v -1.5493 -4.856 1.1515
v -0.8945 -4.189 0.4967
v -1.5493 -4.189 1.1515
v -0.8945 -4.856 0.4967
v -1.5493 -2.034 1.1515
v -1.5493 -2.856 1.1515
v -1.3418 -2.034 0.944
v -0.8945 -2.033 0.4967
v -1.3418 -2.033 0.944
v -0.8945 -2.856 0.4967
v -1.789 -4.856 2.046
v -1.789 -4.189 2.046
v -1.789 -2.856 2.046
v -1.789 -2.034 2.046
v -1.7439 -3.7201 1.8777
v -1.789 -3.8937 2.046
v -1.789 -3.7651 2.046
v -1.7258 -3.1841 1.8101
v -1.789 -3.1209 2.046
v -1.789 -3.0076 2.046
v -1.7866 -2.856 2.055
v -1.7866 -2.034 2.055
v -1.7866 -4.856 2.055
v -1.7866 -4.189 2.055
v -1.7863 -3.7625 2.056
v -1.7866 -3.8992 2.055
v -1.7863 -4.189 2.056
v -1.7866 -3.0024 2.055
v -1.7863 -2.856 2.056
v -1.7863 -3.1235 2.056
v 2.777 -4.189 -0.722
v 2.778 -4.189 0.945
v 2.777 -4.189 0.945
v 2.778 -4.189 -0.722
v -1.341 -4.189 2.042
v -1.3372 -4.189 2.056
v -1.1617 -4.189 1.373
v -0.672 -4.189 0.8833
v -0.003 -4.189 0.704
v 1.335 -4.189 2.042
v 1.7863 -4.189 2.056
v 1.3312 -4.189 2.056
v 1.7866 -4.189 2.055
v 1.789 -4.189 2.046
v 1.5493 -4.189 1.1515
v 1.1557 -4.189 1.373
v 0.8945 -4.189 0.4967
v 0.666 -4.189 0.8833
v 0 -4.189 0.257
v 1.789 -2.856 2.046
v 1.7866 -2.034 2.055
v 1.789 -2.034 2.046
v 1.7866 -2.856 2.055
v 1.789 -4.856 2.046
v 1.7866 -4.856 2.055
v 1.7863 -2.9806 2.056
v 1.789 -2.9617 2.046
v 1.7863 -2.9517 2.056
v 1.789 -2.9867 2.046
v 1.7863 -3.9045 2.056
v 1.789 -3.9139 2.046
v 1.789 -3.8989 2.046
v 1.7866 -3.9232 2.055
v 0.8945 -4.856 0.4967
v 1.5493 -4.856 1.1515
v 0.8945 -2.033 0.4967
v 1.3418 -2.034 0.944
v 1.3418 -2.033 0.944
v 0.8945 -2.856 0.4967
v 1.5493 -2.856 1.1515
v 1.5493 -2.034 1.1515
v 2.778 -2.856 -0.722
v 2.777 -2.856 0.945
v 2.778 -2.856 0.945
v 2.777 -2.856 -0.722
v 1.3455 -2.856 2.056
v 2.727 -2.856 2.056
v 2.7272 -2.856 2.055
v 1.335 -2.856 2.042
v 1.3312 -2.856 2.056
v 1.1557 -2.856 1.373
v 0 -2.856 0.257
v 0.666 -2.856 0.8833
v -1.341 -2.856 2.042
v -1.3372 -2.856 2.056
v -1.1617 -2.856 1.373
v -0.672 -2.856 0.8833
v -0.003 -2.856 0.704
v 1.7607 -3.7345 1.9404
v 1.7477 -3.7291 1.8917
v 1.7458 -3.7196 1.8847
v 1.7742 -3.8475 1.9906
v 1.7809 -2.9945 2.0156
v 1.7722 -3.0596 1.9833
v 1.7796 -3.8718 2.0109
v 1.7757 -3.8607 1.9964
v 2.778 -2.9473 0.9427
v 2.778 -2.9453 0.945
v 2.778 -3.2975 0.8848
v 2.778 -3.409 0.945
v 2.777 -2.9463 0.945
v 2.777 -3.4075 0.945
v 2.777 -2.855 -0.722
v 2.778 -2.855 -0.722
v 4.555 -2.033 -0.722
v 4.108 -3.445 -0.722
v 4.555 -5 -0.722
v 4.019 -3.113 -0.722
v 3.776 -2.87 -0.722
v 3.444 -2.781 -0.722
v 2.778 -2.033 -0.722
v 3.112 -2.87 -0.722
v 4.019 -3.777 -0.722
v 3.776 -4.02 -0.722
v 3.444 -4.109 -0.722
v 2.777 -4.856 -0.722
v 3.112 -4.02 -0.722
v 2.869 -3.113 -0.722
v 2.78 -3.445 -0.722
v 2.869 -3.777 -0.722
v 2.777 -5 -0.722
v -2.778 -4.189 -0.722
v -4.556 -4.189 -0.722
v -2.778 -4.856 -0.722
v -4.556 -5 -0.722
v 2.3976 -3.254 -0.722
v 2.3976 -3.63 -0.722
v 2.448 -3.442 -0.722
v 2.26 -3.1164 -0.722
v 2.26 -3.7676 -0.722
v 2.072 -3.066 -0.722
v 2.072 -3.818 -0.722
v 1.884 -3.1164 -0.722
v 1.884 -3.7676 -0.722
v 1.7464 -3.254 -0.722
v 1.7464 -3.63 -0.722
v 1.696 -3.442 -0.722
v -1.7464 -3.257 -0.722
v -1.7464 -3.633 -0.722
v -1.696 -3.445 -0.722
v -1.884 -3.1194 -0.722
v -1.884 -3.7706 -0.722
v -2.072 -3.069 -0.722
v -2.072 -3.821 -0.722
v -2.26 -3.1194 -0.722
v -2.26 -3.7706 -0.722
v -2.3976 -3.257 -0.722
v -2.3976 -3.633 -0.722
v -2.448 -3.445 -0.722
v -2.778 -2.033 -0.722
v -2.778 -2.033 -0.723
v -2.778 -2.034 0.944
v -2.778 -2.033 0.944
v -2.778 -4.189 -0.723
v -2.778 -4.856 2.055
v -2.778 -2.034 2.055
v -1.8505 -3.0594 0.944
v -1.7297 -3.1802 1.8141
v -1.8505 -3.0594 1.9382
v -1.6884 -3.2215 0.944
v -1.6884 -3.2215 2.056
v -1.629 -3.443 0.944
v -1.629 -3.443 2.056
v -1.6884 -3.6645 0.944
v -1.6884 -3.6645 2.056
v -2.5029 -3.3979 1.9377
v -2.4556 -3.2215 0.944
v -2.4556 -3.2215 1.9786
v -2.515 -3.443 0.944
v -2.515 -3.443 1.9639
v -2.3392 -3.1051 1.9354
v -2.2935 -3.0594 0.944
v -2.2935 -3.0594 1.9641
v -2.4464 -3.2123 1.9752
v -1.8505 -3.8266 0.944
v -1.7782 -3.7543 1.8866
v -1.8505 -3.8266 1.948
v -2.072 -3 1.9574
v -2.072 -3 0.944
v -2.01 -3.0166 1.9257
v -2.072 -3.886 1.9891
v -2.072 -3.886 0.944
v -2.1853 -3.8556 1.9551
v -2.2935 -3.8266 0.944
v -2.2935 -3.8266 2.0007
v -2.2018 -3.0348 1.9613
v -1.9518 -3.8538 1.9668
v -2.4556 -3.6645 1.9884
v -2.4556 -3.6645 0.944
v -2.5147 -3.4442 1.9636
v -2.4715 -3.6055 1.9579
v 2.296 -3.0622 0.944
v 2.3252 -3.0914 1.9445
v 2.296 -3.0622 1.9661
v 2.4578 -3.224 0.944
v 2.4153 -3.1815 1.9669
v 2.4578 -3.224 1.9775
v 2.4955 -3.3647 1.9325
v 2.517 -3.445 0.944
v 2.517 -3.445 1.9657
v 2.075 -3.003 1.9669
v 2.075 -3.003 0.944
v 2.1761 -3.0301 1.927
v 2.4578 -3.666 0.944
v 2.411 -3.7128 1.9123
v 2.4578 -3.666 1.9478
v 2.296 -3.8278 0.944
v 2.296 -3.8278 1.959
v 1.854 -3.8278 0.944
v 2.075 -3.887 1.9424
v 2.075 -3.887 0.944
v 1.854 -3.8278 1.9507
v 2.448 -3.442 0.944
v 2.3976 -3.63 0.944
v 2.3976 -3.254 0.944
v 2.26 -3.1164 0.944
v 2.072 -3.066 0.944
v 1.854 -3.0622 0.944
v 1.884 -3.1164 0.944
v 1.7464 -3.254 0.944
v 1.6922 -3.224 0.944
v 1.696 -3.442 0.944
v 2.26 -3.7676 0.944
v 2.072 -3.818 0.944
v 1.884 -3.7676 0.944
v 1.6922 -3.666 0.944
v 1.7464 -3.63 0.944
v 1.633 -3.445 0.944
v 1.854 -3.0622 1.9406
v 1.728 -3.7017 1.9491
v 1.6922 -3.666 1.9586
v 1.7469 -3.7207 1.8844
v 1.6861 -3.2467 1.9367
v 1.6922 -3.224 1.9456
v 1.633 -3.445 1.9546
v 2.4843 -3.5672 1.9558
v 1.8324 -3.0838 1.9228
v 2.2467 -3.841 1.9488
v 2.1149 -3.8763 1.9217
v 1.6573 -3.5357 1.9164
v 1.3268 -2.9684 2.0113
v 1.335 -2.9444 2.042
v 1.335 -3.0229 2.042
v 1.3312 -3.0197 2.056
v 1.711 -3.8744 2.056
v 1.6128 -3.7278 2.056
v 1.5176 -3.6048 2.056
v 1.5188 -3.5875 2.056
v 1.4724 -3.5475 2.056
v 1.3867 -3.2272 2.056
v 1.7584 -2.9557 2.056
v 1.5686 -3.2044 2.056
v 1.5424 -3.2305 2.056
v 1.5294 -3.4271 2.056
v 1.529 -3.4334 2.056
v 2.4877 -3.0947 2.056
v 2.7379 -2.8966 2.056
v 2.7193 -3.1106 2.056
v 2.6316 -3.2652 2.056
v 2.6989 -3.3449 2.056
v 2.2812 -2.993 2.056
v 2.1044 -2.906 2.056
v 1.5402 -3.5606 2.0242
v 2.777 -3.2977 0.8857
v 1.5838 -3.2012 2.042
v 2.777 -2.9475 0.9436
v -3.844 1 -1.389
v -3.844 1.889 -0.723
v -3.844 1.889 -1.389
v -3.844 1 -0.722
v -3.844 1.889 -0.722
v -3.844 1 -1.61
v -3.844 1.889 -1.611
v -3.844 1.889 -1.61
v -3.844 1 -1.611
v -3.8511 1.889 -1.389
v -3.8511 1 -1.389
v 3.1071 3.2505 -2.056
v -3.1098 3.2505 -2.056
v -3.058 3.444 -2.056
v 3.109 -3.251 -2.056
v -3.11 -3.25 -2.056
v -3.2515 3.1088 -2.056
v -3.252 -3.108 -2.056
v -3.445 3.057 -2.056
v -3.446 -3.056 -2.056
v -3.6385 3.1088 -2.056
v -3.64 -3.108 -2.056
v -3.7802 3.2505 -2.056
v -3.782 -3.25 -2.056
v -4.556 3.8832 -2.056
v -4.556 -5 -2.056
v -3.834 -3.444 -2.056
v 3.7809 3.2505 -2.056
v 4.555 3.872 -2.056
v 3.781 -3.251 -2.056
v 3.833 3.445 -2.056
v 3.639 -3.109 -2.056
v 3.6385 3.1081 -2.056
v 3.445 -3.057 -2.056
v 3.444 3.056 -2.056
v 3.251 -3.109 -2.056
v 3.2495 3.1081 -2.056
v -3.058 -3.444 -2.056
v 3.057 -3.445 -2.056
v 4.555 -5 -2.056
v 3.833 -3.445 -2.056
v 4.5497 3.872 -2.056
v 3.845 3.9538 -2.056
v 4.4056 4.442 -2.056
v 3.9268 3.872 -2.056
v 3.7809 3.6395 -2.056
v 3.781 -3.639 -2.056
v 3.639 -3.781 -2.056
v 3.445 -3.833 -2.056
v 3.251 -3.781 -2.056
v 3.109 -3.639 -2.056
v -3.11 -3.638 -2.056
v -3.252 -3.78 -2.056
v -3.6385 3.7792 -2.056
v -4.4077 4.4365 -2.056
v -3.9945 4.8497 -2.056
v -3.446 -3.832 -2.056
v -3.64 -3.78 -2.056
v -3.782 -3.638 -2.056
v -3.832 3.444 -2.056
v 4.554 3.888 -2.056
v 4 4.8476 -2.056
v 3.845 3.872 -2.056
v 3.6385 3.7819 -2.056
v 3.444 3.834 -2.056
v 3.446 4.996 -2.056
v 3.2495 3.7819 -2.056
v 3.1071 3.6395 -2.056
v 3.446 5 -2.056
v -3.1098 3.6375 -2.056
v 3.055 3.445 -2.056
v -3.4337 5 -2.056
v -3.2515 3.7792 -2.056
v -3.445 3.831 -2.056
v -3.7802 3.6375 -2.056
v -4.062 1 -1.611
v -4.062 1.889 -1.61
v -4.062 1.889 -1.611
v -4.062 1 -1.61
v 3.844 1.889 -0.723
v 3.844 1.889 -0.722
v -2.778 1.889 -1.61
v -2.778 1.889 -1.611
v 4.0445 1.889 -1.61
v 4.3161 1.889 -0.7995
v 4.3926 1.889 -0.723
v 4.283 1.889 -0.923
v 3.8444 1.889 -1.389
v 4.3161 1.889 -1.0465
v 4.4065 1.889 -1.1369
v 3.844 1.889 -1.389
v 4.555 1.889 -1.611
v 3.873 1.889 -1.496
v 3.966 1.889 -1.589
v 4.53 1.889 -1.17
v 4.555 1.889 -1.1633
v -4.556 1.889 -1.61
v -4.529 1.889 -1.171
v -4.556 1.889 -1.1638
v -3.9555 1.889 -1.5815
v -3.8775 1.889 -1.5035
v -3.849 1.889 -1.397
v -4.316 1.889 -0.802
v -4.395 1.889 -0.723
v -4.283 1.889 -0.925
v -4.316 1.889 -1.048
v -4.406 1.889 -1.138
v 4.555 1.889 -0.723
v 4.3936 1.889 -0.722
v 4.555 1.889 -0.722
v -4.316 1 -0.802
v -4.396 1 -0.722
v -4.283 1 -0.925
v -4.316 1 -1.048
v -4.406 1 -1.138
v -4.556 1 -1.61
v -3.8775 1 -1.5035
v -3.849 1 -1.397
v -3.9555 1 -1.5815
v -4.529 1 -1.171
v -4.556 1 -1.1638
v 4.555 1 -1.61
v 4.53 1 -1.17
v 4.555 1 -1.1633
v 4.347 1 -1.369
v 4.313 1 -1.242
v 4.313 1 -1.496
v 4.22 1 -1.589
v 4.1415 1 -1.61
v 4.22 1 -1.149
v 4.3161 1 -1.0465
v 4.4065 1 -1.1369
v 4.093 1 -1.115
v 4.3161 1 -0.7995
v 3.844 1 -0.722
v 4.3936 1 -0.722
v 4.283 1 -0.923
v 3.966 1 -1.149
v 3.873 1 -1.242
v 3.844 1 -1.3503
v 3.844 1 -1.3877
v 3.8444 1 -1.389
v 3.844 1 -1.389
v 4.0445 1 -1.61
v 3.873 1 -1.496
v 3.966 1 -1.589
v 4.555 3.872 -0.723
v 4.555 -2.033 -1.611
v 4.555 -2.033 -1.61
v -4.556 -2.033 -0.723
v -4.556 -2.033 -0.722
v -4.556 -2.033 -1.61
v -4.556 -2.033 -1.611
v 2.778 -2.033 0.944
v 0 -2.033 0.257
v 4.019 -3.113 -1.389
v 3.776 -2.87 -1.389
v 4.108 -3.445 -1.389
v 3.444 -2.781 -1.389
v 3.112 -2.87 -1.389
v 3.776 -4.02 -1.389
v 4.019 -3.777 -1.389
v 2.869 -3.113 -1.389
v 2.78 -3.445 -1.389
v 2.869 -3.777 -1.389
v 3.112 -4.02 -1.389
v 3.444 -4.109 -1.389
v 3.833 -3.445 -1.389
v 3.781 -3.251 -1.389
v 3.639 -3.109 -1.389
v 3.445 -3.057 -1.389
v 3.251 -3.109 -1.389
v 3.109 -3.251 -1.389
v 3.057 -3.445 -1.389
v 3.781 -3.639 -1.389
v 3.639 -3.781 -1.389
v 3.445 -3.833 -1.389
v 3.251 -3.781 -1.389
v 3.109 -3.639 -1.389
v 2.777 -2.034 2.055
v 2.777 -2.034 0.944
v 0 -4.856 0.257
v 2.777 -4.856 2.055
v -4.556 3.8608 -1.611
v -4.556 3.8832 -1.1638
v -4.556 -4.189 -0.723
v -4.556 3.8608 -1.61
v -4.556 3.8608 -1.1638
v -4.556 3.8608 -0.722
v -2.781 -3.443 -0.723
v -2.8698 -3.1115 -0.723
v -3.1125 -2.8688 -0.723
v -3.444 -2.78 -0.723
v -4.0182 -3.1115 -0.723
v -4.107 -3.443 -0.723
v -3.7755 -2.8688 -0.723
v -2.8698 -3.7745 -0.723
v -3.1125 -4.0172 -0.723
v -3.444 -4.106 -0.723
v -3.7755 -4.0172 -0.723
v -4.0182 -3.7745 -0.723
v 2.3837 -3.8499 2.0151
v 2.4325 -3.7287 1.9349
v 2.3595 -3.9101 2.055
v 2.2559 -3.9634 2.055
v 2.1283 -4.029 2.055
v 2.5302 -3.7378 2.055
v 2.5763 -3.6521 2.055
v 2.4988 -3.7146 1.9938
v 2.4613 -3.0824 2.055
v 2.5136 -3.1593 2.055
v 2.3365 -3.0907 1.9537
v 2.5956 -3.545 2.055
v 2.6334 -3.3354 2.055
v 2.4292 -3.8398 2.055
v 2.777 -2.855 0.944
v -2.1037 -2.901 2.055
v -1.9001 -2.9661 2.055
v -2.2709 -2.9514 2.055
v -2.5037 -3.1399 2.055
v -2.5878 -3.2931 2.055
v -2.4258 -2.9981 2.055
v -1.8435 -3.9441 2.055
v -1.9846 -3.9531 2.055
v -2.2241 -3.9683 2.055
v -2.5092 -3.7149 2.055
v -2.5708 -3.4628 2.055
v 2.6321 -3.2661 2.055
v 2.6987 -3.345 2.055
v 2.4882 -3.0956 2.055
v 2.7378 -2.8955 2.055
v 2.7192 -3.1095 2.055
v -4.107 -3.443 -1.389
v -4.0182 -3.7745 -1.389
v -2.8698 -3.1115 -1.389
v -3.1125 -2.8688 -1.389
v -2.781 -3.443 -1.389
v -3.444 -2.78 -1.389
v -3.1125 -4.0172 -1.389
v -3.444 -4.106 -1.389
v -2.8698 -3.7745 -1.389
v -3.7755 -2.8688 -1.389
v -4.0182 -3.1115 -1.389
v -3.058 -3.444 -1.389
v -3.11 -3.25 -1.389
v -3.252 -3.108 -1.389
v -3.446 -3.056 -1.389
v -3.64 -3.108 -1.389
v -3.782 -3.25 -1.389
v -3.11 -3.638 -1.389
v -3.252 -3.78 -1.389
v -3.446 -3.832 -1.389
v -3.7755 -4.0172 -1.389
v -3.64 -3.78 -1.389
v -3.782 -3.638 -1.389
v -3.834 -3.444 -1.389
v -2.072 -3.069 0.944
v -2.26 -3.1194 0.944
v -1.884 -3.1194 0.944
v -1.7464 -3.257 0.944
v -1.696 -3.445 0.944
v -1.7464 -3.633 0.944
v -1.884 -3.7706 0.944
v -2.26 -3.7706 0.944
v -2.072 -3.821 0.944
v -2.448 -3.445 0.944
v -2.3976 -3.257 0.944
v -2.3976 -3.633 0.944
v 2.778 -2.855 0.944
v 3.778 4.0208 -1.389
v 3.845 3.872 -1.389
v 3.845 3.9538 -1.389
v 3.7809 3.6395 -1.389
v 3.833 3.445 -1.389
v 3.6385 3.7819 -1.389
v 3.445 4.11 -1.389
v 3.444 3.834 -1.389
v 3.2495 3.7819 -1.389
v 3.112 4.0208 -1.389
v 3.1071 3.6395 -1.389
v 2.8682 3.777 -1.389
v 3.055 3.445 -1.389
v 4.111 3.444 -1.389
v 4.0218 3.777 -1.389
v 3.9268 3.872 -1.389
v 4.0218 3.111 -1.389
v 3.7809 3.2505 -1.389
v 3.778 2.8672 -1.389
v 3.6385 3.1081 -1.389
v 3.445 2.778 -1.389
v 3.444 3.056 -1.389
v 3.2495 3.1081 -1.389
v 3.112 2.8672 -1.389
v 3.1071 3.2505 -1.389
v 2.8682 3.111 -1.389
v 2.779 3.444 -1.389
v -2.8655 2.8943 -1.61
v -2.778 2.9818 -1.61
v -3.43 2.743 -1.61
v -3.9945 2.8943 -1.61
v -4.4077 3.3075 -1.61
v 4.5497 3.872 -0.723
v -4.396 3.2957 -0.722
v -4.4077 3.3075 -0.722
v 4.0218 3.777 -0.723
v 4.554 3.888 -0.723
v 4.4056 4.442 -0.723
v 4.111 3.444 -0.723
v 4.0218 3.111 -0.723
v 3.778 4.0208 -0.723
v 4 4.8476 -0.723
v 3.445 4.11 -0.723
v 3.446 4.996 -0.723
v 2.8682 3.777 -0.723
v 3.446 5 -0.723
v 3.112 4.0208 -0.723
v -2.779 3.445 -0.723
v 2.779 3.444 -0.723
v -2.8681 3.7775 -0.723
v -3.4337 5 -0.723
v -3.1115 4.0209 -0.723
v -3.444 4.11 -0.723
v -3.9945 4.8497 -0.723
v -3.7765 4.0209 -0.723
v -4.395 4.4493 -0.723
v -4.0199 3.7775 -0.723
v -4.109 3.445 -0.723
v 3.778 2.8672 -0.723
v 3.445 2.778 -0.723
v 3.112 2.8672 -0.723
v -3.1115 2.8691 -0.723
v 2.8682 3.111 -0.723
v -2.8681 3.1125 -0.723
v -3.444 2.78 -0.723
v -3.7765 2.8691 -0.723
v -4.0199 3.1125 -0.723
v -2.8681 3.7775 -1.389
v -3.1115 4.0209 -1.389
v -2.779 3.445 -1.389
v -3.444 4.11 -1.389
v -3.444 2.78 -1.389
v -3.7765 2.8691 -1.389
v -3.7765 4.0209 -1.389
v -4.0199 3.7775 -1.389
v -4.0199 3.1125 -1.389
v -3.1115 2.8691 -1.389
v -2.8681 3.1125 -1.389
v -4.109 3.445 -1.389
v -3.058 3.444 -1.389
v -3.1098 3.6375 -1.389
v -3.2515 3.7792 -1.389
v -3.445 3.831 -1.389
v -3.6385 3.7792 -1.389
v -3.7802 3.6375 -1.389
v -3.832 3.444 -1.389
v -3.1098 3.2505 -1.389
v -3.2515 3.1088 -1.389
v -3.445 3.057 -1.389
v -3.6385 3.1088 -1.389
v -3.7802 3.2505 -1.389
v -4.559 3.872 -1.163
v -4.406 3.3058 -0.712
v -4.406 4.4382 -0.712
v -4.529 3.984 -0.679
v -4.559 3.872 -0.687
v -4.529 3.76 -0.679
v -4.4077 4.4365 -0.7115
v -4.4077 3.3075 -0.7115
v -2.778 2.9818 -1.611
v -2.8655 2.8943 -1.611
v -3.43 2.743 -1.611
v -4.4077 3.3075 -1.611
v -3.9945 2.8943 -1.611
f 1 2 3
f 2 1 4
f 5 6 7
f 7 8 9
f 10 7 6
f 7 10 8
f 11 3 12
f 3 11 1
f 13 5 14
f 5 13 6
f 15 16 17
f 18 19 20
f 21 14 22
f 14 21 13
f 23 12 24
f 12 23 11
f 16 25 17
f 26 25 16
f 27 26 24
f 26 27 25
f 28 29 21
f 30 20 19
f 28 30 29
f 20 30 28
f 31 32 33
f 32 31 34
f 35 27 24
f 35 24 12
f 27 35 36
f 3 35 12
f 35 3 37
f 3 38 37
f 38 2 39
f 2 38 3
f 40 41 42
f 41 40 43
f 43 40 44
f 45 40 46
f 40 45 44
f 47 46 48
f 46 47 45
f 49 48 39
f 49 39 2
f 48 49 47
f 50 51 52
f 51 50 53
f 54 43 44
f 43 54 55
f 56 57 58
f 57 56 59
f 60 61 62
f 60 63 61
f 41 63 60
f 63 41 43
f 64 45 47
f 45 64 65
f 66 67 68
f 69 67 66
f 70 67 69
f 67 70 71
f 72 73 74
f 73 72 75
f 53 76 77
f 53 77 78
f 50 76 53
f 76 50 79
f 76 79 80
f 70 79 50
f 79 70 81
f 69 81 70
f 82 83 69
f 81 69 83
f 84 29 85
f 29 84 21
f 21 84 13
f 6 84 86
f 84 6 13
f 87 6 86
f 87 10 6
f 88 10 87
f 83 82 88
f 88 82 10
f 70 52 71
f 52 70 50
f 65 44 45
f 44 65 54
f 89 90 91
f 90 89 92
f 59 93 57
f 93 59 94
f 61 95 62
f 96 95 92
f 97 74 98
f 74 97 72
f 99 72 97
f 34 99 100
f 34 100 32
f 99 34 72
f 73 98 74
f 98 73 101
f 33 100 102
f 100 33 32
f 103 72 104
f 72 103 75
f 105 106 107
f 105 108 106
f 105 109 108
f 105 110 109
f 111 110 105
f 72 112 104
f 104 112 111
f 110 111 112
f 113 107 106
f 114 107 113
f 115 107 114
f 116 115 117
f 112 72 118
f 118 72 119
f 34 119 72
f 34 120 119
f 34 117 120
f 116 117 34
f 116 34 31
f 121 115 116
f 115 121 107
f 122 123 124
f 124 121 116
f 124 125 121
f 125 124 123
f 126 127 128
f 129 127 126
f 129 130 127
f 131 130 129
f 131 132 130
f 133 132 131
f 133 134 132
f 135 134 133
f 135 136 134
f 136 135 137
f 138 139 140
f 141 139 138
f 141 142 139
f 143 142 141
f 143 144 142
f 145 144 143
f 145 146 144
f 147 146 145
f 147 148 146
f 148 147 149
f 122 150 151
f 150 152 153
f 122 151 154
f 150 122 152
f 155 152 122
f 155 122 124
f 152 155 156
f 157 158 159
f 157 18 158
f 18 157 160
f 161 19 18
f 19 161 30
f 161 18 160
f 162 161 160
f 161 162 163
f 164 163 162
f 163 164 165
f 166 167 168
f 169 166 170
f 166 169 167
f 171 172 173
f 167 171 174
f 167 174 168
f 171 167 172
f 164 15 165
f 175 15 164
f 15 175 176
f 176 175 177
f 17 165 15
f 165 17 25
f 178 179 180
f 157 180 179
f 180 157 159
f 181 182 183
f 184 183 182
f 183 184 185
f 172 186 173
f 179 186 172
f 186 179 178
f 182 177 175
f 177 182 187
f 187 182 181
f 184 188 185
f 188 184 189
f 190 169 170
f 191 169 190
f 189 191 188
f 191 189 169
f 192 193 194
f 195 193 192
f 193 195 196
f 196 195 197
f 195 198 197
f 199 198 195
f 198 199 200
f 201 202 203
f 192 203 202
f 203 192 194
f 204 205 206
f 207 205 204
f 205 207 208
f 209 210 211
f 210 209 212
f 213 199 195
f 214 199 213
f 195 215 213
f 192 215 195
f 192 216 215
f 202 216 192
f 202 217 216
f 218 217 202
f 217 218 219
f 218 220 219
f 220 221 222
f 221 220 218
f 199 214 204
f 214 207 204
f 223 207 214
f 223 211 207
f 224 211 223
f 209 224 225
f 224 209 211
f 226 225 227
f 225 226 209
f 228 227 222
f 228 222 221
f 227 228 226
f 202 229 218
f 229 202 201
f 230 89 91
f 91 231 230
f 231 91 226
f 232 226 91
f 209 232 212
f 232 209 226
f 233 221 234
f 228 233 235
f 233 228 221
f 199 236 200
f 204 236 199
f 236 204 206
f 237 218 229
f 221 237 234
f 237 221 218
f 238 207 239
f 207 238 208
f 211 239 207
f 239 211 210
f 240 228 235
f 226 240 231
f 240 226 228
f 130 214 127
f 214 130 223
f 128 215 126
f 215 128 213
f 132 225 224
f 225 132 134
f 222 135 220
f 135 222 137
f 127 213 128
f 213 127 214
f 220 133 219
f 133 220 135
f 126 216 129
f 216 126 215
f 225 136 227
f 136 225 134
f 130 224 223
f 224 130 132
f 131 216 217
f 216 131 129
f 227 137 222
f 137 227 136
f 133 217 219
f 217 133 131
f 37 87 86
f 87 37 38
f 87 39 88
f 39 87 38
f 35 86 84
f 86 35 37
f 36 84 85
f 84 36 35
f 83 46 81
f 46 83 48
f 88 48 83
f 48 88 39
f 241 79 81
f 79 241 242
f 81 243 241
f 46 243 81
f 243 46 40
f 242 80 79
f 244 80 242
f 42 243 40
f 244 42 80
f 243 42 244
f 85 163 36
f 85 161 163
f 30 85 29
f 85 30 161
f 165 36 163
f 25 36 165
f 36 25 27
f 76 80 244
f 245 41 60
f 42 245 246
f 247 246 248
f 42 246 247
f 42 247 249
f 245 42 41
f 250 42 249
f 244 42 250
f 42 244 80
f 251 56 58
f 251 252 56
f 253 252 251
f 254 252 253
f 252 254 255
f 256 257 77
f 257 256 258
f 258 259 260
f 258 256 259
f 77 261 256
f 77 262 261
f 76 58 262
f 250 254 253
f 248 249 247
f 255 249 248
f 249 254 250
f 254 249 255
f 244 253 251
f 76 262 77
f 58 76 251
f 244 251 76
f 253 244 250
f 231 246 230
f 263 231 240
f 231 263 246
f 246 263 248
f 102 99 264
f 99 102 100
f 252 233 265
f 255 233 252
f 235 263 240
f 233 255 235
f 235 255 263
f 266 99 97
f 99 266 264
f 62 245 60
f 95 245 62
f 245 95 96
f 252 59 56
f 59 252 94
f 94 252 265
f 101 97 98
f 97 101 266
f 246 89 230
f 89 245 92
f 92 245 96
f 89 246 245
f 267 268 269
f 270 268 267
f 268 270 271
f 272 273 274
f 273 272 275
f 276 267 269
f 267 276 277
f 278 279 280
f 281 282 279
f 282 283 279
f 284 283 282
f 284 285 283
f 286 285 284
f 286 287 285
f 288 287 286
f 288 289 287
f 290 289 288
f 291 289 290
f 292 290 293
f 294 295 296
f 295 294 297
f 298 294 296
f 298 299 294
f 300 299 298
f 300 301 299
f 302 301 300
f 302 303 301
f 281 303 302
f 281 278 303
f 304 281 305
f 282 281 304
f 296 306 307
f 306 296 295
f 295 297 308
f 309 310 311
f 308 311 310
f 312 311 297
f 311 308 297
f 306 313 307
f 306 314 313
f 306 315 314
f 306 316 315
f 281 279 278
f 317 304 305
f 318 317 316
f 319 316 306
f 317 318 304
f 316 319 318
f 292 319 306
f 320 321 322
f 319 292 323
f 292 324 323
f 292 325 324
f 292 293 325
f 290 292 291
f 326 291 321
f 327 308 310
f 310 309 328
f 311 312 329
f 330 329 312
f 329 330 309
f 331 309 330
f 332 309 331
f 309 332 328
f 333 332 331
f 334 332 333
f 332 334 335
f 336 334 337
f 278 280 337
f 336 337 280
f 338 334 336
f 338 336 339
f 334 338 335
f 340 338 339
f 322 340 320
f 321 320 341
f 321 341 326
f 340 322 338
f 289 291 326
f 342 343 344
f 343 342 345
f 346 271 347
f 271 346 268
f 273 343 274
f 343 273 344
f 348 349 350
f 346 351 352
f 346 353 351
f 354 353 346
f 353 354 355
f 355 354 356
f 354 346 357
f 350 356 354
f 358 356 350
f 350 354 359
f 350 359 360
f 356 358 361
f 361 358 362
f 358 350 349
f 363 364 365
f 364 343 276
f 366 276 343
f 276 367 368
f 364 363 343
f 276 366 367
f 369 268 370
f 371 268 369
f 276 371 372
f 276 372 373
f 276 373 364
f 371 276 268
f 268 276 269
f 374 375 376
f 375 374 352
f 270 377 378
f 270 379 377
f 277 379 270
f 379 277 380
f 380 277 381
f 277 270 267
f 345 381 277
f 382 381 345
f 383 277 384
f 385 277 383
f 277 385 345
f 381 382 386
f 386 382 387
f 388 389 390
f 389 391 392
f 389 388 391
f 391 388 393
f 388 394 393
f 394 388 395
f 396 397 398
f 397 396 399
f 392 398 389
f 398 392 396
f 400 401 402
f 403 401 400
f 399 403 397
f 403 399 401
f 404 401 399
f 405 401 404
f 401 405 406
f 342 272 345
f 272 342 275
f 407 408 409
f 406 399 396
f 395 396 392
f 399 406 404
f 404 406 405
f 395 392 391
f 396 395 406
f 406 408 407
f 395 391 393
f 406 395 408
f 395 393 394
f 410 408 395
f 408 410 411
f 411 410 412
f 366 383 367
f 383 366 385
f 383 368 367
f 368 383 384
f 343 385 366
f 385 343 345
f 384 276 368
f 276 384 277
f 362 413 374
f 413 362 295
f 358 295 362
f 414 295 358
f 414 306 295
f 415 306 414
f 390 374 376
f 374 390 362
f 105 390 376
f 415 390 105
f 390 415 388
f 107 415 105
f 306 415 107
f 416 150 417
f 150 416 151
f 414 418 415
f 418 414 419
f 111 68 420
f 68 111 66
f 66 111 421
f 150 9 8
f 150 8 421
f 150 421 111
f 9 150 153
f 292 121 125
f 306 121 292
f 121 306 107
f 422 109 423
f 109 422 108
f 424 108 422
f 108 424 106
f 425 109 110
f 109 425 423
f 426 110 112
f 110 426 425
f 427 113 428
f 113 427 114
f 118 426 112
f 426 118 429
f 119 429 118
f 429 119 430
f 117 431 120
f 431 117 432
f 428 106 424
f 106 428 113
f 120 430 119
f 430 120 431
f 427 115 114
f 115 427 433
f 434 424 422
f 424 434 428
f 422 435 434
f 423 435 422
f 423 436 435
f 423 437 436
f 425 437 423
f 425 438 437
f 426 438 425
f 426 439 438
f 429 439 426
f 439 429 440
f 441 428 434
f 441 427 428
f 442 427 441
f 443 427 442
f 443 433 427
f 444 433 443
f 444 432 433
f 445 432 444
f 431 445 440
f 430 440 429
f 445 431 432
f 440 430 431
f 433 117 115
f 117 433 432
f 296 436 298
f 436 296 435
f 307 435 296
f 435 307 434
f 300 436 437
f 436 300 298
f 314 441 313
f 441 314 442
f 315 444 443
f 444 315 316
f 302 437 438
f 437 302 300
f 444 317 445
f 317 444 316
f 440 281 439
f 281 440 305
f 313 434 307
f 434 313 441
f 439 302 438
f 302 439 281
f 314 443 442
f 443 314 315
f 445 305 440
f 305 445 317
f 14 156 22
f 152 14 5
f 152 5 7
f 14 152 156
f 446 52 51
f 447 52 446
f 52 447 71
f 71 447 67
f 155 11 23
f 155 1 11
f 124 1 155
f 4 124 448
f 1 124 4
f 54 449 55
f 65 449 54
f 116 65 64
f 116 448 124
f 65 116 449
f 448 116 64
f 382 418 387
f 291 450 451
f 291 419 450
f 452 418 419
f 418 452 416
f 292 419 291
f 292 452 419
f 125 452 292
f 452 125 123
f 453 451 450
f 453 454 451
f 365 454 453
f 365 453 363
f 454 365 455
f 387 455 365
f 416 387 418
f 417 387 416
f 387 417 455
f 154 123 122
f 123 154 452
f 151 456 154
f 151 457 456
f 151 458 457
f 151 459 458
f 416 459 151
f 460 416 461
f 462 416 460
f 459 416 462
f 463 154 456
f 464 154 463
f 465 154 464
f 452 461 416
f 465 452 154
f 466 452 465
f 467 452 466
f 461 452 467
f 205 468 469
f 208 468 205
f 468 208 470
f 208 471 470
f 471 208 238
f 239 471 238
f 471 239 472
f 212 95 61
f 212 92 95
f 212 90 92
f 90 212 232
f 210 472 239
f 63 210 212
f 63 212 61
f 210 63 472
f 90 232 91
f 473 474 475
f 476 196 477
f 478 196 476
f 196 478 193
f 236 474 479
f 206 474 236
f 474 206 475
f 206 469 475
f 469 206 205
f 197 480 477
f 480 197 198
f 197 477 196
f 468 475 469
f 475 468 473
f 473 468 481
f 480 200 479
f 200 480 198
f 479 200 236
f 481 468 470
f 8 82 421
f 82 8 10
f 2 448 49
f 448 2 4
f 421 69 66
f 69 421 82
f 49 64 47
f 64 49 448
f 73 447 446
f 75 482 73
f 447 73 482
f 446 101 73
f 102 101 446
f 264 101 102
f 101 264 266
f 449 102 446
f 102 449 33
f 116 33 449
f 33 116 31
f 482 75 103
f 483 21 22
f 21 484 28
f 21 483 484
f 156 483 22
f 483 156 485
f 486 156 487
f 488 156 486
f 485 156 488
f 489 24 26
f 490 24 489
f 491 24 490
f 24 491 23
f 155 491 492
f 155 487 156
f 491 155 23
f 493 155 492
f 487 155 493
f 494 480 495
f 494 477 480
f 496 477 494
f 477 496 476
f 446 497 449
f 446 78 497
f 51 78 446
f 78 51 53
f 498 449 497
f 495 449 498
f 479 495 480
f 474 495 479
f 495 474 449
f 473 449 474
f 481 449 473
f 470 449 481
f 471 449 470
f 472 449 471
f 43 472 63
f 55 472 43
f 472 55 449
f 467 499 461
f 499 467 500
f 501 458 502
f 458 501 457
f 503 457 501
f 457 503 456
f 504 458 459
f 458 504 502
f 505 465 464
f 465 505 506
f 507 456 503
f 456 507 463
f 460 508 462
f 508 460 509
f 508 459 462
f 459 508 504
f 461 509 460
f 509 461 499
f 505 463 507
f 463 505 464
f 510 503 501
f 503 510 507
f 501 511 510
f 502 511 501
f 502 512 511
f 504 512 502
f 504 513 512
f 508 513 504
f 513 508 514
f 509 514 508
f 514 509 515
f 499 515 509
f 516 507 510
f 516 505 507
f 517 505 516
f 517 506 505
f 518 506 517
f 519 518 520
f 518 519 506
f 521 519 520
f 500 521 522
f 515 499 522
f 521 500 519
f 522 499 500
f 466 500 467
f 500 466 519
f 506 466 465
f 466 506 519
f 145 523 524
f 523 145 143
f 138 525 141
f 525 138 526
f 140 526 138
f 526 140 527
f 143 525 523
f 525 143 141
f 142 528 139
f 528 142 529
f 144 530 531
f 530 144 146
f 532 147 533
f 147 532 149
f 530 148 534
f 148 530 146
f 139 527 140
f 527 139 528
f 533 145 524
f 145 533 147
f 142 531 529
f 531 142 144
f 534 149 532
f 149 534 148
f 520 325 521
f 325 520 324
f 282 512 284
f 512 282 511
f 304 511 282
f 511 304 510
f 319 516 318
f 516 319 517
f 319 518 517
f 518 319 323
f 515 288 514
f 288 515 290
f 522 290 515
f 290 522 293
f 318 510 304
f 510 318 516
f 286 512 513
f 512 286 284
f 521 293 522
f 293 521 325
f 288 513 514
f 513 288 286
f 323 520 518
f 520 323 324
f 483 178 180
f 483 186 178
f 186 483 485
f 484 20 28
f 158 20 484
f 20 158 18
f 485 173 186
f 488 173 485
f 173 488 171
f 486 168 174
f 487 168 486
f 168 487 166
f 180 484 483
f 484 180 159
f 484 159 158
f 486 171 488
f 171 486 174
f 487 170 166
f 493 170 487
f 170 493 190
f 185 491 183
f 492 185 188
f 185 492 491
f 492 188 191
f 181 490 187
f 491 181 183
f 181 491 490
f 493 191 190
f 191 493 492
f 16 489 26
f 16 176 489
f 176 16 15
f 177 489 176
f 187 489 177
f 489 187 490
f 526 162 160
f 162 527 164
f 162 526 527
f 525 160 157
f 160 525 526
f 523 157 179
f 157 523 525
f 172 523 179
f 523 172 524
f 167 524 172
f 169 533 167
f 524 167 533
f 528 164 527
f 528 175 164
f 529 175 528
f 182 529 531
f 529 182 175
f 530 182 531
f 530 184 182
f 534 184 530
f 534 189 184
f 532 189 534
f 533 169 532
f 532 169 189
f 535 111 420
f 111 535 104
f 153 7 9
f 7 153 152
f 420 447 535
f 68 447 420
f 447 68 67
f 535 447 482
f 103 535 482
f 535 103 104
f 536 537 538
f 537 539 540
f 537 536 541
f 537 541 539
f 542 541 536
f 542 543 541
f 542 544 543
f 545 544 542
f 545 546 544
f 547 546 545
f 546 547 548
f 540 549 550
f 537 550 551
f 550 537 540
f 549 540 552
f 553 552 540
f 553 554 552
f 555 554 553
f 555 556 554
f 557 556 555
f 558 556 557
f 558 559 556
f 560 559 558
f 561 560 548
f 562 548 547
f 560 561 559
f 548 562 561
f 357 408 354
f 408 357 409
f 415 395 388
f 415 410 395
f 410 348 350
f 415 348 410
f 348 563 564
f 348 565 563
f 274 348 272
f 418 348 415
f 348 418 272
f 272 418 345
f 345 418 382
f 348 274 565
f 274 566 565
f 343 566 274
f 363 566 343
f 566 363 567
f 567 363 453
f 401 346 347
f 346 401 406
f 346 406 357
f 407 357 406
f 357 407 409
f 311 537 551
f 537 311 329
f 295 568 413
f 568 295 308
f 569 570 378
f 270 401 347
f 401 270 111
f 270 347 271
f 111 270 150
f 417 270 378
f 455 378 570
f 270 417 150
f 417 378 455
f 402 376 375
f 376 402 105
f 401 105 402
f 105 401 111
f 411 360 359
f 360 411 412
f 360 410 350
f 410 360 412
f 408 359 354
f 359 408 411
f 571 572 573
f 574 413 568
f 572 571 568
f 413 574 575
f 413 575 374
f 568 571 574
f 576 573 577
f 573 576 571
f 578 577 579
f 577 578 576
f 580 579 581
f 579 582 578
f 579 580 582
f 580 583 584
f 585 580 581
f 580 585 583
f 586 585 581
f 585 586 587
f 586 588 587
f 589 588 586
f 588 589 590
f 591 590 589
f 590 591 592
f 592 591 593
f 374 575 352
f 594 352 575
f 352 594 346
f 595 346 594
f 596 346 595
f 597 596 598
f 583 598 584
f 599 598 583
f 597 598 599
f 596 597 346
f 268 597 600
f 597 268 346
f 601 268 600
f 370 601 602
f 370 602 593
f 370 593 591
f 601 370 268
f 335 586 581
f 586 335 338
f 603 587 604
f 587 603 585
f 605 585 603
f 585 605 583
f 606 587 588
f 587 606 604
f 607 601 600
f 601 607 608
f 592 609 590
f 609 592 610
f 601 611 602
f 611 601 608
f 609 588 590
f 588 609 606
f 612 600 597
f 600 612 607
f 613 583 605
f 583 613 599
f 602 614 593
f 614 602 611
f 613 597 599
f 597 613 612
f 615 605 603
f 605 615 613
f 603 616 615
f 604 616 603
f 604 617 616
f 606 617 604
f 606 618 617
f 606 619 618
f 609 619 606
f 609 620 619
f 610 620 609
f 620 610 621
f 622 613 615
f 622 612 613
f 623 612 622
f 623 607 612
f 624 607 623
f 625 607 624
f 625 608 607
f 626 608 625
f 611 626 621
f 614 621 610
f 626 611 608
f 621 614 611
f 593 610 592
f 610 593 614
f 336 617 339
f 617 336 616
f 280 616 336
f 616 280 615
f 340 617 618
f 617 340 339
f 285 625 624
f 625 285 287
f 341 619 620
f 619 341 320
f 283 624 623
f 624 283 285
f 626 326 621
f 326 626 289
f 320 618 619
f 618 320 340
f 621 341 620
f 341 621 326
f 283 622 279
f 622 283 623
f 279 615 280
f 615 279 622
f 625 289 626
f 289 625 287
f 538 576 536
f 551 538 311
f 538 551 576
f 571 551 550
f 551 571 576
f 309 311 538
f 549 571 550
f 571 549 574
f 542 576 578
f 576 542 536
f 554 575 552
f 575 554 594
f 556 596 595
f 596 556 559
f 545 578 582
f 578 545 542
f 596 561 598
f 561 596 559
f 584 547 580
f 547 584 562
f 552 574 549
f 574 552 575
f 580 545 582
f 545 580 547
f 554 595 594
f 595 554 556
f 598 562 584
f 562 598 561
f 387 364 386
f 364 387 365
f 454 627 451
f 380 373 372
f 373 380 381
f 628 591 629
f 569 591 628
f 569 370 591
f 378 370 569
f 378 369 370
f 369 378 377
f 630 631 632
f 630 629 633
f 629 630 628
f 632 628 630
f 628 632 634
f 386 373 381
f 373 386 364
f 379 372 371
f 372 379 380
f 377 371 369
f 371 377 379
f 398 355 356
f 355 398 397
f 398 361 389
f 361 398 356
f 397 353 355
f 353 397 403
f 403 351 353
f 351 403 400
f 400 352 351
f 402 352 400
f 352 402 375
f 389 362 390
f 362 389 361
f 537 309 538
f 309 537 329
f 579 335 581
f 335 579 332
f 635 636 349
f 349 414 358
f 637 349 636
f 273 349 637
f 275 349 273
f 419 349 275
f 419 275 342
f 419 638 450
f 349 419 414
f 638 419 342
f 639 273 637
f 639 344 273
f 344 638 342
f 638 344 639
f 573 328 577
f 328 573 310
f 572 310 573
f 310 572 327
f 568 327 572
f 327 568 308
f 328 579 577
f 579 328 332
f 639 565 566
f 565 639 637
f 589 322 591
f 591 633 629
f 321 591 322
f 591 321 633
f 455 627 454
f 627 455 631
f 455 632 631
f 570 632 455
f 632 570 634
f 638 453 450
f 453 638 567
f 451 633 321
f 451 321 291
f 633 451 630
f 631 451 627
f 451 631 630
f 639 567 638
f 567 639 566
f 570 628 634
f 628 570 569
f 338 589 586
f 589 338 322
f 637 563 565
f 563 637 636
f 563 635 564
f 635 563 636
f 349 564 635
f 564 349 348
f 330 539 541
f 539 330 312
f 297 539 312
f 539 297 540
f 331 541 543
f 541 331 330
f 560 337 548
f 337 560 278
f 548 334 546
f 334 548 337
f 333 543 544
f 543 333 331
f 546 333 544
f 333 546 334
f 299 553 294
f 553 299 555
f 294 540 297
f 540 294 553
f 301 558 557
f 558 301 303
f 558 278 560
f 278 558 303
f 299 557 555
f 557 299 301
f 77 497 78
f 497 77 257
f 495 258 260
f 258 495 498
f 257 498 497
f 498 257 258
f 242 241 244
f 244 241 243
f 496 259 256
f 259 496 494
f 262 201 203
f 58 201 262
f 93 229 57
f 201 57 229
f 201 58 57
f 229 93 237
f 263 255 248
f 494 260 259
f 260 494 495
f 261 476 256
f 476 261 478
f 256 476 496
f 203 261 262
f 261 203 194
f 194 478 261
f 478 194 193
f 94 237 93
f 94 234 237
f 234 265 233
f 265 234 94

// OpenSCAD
intersection() {
translate([-5.467, -6, -2.467]) cube(size = [10.933, 12, 4.933], center = false);
union() {
difference() {
difference() {
union() {
rotate([180, 90, -90])
translate([-2.046, 0, -4.189])
cylinder(h = 1.333, r1 = 1.789, r2 = 1.789, center = false, $fn = 12);
translate([-2.778, -4.189, -0.722]) cube(size = [5.556, 1.333, 1.667], center = false);
}
union() {
translate([-2.072, -3.443, -0.722])
cylinder(h = 18.822, r1 = 0.443, r2 = 0.443, center = false, $fn = 12);
translate([2.075, -3.445, 0.944])
cylinder(h = 17.156, r1 = 0.442, r2 = 0.442, center = false, $fn = 12);
}
}
union() {
rotate([180, 0, 180])
translate([-2.072, -3.442, -0.944])
cylinder(h = 2.333, r1 = 0.376, r2 = 0.376, center = false, $fn = 12);
rotate([180, 90, -90])
translate([-2.042, 0.003, -4.189])
cylinder(h = 1.333, r1 = 1.338, r2 = 1.338, center = false, $fn = 12);
translate([-2.778, -18.1, 2.056]) cube(size = [7.333, 16.067, 16.045], center = false);
rotate([180, 48, -168])
translate([-2.702, -3.803, -18.1])
cylinder(h = 36.2, r1 = 0.685, r2 = 0.685, center = false, $fn = 12);
}
}
difference() {
translate([-4.062, 1, -2.056]) cube(size = [0.218, 0.889, 0.667], center = false);
rotate([180, 90, -90])
translate([1.397, 4.062, -18.1])
cylinder(h = 19.989, r1 = 0.213, r2 = 0.213, center = false, $fn = 12);
}
difference() {
difference() {
translate([-2.778, -5, -2.056]) cube(size = [7.333, 2.967, 3], center = false);
translate([3.444, -3.445, -1.389])
cylinder(h = 0.667, r1 = 0.664, r2 = 0.664, center = false, $fn = 12);
}
union() {
translate([3.445, -3.445, -2.056])
cylinder(h = 0.667, r1 = 0.388, r2 = 0.388, center = false, $fn = 12);
translate([-2.778, -5, -0.722]) cube(size = [7.333, 2.967, 2.778], center = false);
}
}
translate([-4.556, -2.033, -2.056]) cube(size = [9.111, 3.922, 0.445], center = false);
intersection() {
difference() {
union() {
translate([-2.778, -4.856, -2.056]) cube(size = [5.556, 2.822, 20.156], center = false);
translate([-4.556, -5, -18.1]) cube(size = [22.656, 0.811, 17.378], center = false);
translate([-4.556, -4.189, -2.056]) cube(size = [1.778, 2.156, 1.333], center = false);
}
union() {
rotate([180, 90, -90])
translate([-2.046, 0, -18.1])
cylinder(h = 36.2, r1 = 1.789, r2 = 1.789, center = false, $fn = 12);
intersection() {
rotate([0, 49, -85])
translate([0.498, 1.769, -18.1])
cylinder(h = 36.2, r1 = 0.706, r2 = 0.706, center = false, $fn = 12);
rotate([0, 49, 12])
translate([-1.002, -3.81, -18.1])
cylinder(h = 36.2, r1 = 0.686, r2 = 0.686, center = false, $fn = 12);
}
translate([2.075, -3.445, -0.722])
cylinder(h = 18.822, r1 = 0.442, r2 = 0.442, center = false, $fn = 12);
}
}
difference() {
difference() {
difference() {
translate([-4.556, -5, -2.056]) cube(size = [7.333, 2.967, 4.111], center = false);
translate([-3.444, -3.443, -1.389])
cylinder(h = 0.667, r1 = 0.663, r2 = 0.663, center = false, $fn = 12);
}
union() {
translate([-2.072, -3.445, -18.1])
cylinder(h = 36.2, r1 = 0.376, r2 = 0.376, center = false, $fn = 12);
translate([-3.446, -3.444, -18.1])
cylinder(h = 36.2, r1 = 0.388, r2 = 0.388, center = false, $fn = 12);
}
}
union() {
intersection() {
rotate([180, 49, 129])
translate([-2.701, -3.772, -18.1])
cylinder(h = 36.2, r1 = 0.623, r2 = 0.623, center = false, $fn = 12);
rotate([-180, 50, -109])
translate([0.599, 0.811, -18.1])
cylinder(h = 36.2, r1 = 0.704, r2 = 0.704, center = false, $fn = 12);
}
translate([-2.072, -3.443, 0.944])
cylinder(h = 17.156, r1 = 0.443, r2 = 0.443, center = false, $fn = 12);
}
}
}
difference() {
union() {
translate([3.844, 1, -1.61]) cube(size = [0.249, 2.872, 0.221], center = false);
translate([-4.556, -2.033, -1.61]) cube(size = [9.111, 3.033, 0.888], center = false);
difference() {
translate([-2.778, -2.855, -2.056]) cube(size = [5.556, 0.822, 3], center = false);
rotate([180, 90, -90])
translate([-2.046, 0, -18.1])
cylinder(h = 19.1, r1 = 1.789, r2 = 1.789, center = false, $fn = 12);
}
}
rotate([180, 90, -90])
translate([1.369, -4.093, 1])
cylinder(h = 0.889, r1 = 0.254, r2 = 0.254, center = false, $fn = 12);
}
intersection() {
union() {
difference() {
difference() {
translate([-4.556, 1.889, -2.056]) cube(size = [22.656, 3.111, 1.333], center = false);
translate([-3.444, 3.445, -1.389])
cylinder(h = 19.489, r1 = 0.665, r2 = 0.665, center = false, $fn = 12);
}
union() {
translate([-3.445, 3.444, -18.1])
cylinder(h = 16.711, r1 = 0.387, r2 = 0.387, center = false, $fn = 12);
translate([3.445, 3.444, -18.1])
cylinder(h = 36.2, r1 = 0.666, r2 = 0.666, center = false, $fn = 12);
}
}
rotate([180, 90, -90])
translate([0.925, 4.529, -2.033])
cylinder(h = 7.033, r1 = 0.246, r2 = 0.246, center = false, $fn = 12);
rotate([180, 90, -90])
translate([0.923, -4.53, -2.033])
cylinder(h = 3.922, r1 = 0.247, r2 = 0.247, center = false, $fn = 12);
translate([2.778, 3.872, -2.056]) cube(size = [1.067, 1.128, 0.667], center = false);
translate([-3.844, 1, -1.61]) cube(size = [7.688, 0.889, 0.888], center = false);
}
union() {
translate([-3.43, 3.872, -2.056]) cube(size = [6.876, 1.128, 1.333], center = false);
translate([-18.1, 1.889, -2.056]) cube(size = [20.878, 1.983, 0.445], center = false);
translate([3.446, 3.888, -2.056])
cylinder(h = 20.156, r1 = 1.108, r2 = 1.108, center = false, $fn = 12);
translate([-3.43, 3.872, -2.056])
cylinder(h = 20.156, r1 = 1.129, r2 = 1.129, center = false, $fn = 12);
translate([-4.556, -2.033, -1.61]) cube(size = [9.111, 5.905, 0.888], center = false);
}
}
difference() {
translate([-2.778, 1.889, -2.056]) cube(size = [7.333, 1.983, 0.667], center = false);
translate([3.444, 3.445, -2.056])
cylinder(h = 20.156, r1 = 0.389, r2 = 0.389, center = false, $fn = 12);
}
intersection() {
difference() {
rotate([0, 49, -85])
translate([0.498, 1.769, -18.1])
cylinder(h = 36.2, r1 = 0.706, r2 = 0.706, center = false, $fn = 12);
rotate([180, 48, 120])
translate([-4.478, 0.045, -18.1])
cylinder(h = 36.2, r1 = 0.649, r2 = 0.649, center = false, $fn = 12);
}
difference() {
translate([-2.778, -4.856, -0.722]) cube(size = [5.556, 2, 2.778], center = false);
translate([2.075, -3.445, -2.056])
cylinder(h = 20.156, r1 = 0.442, r2 = 0.442, center = false, $fn = 12);
}
}
}
}
